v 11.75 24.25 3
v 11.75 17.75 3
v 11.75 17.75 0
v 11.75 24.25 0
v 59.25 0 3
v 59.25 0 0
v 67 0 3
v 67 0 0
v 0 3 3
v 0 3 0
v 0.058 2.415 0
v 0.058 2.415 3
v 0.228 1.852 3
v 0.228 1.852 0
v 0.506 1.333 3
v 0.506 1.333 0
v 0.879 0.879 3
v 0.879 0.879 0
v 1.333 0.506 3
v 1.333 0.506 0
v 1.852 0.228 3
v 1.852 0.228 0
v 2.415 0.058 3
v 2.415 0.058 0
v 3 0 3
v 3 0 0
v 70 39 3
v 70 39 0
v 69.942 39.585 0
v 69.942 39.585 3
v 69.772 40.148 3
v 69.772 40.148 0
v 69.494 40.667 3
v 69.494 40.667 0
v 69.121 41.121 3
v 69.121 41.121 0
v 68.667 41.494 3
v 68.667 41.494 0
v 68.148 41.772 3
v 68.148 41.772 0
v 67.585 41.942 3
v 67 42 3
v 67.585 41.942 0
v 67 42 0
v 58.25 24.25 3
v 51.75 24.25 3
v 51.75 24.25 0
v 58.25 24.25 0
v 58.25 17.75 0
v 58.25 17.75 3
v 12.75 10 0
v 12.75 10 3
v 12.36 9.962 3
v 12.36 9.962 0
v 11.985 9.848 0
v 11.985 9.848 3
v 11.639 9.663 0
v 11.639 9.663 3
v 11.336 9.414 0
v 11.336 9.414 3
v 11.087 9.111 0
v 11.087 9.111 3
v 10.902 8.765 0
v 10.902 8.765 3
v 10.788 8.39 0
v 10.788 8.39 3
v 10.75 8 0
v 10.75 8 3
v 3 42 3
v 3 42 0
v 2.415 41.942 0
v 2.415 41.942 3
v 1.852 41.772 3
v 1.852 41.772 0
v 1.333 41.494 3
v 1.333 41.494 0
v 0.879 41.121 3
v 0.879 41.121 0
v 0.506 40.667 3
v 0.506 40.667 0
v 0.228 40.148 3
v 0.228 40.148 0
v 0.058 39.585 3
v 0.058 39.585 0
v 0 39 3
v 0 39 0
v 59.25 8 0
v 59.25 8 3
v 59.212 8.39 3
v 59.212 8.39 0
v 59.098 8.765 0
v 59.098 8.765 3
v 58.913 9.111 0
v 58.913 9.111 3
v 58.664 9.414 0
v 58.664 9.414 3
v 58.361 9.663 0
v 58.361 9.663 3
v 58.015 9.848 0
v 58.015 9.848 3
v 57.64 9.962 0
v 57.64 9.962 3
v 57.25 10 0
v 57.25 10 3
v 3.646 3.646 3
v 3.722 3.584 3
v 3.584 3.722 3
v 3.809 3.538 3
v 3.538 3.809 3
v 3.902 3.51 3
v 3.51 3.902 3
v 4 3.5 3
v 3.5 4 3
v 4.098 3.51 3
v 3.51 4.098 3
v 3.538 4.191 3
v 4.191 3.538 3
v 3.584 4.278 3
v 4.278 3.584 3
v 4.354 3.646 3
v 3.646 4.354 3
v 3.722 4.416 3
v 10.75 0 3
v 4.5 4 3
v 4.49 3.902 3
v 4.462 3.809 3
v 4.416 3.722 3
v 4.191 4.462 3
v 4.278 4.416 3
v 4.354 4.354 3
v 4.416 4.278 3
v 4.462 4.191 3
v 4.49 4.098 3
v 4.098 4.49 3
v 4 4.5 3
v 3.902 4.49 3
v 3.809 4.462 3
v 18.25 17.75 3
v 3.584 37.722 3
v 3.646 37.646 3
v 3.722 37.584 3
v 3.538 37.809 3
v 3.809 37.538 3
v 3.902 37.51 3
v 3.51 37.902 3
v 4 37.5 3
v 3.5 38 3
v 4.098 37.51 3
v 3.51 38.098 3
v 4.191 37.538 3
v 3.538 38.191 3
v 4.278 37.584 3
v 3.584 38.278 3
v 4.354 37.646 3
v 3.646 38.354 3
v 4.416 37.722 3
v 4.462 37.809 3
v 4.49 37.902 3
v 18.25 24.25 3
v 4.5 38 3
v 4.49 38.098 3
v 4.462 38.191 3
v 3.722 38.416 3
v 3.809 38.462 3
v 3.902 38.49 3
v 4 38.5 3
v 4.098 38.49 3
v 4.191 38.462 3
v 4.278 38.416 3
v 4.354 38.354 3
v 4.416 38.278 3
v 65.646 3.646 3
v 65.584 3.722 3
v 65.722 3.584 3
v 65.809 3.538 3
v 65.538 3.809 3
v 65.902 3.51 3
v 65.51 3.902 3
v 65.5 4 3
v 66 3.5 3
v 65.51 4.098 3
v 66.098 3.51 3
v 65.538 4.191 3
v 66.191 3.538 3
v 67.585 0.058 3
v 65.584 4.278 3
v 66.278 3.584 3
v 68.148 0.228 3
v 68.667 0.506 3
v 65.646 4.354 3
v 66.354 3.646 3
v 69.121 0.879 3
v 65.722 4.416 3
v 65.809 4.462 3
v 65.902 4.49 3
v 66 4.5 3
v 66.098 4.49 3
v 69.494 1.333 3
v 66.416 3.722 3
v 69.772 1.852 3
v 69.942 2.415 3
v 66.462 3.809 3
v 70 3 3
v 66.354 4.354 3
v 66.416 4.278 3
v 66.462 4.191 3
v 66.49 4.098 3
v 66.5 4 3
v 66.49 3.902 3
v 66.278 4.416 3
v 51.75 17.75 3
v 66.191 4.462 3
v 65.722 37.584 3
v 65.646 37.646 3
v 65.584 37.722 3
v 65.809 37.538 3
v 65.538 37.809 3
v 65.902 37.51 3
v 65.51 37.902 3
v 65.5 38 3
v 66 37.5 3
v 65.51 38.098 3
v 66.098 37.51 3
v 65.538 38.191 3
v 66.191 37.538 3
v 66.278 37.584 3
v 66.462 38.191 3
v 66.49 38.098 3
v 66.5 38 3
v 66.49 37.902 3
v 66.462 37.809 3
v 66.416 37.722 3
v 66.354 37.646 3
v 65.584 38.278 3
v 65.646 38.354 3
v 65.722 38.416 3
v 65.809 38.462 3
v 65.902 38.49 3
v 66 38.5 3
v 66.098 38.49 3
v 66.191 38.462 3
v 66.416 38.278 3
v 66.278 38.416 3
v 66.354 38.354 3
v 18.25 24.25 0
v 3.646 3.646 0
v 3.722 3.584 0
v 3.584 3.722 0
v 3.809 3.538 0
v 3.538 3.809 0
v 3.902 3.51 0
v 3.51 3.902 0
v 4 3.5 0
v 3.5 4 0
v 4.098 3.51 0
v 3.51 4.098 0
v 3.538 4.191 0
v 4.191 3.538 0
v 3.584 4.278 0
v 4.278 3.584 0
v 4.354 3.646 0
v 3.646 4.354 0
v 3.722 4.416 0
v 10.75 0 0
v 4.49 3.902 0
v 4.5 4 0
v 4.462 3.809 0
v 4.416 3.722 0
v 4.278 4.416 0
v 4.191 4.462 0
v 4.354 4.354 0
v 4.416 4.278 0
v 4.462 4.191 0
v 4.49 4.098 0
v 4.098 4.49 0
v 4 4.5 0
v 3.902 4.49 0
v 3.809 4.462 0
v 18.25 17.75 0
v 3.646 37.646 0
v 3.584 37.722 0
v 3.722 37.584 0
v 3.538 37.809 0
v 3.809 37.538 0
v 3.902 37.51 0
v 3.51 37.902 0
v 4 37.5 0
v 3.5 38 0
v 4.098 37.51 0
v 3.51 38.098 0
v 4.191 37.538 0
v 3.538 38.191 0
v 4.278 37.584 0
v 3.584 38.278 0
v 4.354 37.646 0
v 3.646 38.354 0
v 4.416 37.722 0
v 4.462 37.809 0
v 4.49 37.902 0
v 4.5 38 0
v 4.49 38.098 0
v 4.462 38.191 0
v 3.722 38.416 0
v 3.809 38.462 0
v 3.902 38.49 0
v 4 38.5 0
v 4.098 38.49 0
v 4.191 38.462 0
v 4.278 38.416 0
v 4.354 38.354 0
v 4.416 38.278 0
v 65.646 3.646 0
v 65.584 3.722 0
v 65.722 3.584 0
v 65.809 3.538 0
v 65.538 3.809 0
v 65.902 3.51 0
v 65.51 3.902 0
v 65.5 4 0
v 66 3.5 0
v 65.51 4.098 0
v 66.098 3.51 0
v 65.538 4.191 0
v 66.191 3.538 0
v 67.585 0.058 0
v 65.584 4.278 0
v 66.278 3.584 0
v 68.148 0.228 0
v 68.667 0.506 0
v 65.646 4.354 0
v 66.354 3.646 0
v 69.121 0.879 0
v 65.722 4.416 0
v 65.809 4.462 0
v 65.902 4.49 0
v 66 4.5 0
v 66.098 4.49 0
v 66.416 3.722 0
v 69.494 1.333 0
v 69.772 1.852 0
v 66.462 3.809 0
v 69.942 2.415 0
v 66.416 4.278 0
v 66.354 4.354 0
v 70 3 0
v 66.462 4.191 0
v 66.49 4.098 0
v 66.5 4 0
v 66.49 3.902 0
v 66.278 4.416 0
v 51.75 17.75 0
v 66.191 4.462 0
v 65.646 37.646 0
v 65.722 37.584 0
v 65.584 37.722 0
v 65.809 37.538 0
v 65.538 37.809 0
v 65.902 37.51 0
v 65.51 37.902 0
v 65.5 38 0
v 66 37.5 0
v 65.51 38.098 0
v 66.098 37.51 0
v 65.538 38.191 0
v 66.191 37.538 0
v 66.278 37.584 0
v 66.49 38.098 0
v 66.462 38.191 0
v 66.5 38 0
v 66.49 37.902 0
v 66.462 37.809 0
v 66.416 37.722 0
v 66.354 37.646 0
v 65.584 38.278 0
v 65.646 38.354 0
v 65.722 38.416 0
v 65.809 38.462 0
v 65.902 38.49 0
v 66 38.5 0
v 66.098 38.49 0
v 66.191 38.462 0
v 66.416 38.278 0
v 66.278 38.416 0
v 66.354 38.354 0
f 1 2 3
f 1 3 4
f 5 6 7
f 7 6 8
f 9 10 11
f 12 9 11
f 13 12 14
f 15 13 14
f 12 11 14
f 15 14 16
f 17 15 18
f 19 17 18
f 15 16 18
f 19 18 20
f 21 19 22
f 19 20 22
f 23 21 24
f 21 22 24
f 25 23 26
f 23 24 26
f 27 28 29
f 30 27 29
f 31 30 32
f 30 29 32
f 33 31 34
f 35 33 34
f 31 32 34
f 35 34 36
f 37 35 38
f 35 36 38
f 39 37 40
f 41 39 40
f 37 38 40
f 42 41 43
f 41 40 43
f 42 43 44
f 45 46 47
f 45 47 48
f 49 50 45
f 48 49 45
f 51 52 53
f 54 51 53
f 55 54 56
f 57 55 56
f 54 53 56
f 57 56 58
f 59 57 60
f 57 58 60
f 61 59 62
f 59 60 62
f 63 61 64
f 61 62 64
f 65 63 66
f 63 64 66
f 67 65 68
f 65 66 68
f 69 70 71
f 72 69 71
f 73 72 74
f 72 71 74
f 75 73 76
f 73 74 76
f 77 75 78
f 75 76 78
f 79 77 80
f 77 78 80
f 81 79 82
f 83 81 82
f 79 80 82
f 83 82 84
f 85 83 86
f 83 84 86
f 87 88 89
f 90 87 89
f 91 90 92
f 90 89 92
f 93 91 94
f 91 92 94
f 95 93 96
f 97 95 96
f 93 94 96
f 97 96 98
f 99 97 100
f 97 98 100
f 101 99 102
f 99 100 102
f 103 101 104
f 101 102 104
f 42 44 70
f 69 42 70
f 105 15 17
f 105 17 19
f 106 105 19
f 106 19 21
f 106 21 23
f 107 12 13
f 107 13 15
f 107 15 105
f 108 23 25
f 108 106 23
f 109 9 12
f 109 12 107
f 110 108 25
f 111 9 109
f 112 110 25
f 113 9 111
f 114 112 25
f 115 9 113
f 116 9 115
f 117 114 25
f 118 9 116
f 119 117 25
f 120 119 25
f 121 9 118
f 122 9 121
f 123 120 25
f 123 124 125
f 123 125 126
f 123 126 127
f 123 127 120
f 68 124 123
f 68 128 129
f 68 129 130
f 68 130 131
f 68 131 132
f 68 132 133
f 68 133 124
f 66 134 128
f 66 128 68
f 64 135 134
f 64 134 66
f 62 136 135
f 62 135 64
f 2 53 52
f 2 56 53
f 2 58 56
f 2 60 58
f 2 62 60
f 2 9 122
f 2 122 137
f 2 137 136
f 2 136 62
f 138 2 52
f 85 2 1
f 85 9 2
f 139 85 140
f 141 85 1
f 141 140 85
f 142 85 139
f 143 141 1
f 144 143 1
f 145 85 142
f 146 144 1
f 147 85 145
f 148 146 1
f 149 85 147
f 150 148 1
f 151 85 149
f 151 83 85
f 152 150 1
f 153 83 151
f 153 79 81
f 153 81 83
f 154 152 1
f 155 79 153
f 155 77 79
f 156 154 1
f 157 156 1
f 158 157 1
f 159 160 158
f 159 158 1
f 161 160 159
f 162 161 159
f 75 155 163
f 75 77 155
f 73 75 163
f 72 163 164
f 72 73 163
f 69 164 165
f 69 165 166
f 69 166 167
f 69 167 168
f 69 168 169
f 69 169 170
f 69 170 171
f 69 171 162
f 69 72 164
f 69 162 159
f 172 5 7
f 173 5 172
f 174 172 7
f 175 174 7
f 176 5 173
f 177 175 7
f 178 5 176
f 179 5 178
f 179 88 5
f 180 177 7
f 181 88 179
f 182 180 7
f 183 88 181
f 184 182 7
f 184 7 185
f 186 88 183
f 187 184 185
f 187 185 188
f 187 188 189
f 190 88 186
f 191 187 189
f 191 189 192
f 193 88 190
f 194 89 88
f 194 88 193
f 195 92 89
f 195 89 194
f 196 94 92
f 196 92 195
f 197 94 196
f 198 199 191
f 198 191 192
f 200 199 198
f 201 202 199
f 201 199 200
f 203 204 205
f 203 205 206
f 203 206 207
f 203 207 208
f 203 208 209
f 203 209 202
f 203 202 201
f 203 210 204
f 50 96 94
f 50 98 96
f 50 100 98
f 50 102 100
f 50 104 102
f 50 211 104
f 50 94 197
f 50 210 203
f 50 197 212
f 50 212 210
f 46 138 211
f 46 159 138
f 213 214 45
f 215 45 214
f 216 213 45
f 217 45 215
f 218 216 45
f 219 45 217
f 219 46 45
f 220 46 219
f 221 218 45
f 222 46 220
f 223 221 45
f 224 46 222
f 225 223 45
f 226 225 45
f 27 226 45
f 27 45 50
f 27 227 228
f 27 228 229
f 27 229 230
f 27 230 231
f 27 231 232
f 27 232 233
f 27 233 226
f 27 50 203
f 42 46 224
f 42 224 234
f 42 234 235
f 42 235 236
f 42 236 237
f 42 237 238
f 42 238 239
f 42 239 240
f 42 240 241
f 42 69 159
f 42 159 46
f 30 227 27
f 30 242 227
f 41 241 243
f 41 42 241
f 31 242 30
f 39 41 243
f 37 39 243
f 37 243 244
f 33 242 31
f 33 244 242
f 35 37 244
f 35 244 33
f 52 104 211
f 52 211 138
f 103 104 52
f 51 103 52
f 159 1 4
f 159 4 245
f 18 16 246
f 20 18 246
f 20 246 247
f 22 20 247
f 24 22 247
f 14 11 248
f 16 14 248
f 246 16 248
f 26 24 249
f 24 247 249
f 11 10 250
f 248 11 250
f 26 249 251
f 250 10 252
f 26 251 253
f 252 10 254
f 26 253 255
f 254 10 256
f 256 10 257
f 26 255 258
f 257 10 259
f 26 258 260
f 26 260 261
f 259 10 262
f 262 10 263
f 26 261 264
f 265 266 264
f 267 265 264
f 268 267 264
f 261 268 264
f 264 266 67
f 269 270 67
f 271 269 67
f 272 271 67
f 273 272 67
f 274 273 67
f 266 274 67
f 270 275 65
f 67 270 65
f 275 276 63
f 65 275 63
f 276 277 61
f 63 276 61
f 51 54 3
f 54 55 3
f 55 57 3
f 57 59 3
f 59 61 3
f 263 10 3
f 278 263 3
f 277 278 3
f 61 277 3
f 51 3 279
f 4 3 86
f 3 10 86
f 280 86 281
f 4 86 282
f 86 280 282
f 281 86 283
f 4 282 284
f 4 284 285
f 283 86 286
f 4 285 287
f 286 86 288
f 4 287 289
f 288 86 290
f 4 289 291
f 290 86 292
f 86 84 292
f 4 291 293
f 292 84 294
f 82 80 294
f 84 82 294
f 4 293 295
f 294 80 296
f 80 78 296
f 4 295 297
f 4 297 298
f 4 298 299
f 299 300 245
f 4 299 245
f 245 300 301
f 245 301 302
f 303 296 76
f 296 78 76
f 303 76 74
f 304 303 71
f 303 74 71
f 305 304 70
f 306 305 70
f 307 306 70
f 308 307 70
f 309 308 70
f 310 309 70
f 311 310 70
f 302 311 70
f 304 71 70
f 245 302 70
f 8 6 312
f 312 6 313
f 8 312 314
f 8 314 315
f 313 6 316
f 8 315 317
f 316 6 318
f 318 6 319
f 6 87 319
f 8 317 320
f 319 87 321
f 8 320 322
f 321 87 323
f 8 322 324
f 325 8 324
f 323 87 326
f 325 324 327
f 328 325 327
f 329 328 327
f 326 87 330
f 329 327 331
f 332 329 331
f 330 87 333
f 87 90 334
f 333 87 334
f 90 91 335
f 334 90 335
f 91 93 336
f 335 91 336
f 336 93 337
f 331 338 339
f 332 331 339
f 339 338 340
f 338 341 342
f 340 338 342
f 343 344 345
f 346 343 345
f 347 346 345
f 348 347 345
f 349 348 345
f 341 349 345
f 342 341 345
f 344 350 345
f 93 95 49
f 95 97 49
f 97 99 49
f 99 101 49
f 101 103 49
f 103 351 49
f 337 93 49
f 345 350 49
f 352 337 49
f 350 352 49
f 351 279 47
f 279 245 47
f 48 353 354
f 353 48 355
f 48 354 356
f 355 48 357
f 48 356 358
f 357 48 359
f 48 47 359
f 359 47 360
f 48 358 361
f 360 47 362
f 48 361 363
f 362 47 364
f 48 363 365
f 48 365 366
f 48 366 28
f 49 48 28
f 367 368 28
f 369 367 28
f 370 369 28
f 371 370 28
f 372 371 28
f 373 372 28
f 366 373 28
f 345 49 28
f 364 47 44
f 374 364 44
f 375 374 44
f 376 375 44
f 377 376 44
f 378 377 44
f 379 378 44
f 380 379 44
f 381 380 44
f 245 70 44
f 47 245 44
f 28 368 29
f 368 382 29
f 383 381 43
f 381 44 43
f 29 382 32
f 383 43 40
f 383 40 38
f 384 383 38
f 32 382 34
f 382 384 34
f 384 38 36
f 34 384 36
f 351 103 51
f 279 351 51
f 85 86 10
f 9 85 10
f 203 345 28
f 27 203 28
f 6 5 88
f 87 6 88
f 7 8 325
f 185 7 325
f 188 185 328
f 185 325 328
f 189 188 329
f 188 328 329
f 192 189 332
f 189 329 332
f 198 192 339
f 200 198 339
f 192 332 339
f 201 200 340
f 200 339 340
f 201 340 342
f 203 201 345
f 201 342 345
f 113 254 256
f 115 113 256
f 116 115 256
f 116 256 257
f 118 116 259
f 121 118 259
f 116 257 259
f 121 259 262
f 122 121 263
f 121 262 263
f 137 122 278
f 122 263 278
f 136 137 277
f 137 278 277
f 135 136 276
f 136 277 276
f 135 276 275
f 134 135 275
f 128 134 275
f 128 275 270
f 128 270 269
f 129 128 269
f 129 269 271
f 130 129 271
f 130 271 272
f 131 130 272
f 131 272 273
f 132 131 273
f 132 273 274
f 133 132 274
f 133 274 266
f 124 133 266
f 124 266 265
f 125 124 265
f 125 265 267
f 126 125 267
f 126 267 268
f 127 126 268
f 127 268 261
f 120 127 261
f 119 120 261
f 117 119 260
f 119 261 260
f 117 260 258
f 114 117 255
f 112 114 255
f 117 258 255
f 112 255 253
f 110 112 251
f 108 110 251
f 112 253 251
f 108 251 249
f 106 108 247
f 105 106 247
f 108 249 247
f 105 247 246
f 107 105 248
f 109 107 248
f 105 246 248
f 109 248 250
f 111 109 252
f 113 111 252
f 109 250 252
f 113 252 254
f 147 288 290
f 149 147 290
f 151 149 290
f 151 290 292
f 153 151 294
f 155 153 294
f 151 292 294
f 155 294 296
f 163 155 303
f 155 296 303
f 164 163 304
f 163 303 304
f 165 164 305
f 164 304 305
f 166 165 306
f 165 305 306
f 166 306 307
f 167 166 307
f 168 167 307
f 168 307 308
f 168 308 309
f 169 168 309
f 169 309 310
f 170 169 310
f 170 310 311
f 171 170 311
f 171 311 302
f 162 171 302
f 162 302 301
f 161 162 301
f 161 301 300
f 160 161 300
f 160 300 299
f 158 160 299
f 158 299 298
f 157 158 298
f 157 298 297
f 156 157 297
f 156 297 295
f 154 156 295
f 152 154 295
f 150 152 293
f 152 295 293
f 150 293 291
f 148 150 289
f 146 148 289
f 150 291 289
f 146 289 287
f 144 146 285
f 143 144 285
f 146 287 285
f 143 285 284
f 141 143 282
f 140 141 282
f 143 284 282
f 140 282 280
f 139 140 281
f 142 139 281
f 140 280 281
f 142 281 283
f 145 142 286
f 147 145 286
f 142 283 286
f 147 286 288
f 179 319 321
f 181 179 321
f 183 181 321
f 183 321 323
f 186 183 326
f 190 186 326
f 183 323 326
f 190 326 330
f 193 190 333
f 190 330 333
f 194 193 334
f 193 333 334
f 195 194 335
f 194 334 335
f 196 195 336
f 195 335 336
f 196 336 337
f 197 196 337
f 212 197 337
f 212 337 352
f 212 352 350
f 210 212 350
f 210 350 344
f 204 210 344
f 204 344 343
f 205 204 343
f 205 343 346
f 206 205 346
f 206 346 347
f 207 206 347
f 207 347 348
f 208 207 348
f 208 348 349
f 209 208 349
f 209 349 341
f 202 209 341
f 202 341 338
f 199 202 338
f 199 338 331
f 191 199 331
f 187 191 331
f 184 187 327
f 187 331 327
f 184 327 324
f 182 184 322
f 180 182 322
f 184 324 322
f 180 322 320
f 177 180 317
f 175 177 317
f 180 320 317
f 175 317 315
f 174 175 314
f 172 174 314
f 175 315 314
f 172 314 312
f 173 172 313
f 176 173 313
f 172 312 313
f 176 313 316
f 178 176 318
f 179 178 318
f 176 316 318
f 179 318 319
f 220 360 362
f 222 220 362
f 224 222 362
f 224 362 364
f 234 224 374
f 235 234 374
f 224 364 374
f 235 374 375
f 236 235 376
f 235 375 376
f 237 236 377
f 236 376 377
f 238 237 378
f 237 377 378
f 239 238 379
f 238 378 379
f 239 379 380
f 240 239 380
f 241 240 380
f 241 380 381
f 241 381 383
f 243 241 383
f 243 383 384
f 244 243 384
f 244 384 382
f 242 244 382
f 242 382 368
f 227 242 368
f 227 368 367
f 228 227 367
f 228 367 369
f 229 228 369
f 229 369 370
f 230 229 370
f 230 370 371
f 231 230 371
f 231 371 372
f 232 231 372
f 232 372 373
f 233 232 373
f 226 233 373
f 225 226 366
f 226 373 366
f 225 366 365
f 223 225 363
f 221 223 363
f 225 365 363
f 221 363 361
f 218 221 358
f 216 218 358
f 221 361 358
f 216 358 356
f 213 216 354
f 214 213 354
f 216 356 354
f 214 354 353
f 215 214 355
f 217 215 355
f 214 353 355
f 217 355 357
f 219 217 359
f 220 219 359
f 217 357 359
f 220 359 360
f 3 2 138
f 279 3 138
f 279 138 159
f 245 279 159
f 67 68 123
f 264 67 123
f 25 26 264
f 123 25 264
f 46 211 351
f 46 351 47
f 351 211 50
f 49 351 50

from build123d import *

# Parameters (mm, degrees)
F1_DEPTH = 3
F3_D     = 4
F4_W     = 6.5
F4_H     = 6.5
F5_DEPTH = 3
F6_R     = 2
F7_DEPTH = 3.001
F9_D     = 1


with BuildPart() as f1:
    # F0 (on Top) → F1 (new body)
    with BuildSketch(Plane.XY):
        with BuildLine():
            ThreePointArc((0, 3), (0.87868, 0.87868), (3, 0))
            Line((3, 0), (67, 0))
            ThreePointArc((67, 0), (69.12132, 0.87868), (70, 3))
            Line((70, 3), (70, 39))
            ThreePointArc((70, 39), (69.12132, 41.12132), (67, 42))
            Line((67, 42), (3, 42))
            ThreePointArc((3, 42), (0.87868, 41.12132), (0, 39))
            Line((0, 39), (0, 3))
        make_face()
    extrude(amount=F1_DEPTH)

    # F3 (through all)
    with Locations(Plane.XY.offset(3)):
        with Locations((14, 7), (24.5, 7), (35, 7), (45.5, 7), (56, 7)):
            Hole(F3_D / 2)

    # F4 (on face) → F5 (cut, through all)
    with BuildSketch(Plane.XY.offset(3)):
        with Locations((15, 21)):
            Rectangle(F4_W, F4_H)
        with Locations((55, 21)):
            Rectangle(F4_W, F4_H)
    extrude(amount=-F5_DEPTH, mode=Mode.SUBTRACT)

    # F6 (on face) → F7 (cut, through all)
    with BuildSketch(Plane.XY.offset(3)):
        with BuildLine():
            Line((57.25, 10), (12.75, 10))
            ThreePointArc((12.75, 10), (11.335786, 9.414214), (10.75, 8))
            Line((10.75, 8), (10.75, 0))
            Line((10.75, 0), (59.25, 0))
            Line((59.25, 0), (59.25, 8))
            ThreePointArc((59.25, 8), (58.664214, 9.414214), (57.25, 10))
        make_face()
        with Locations((14, 7)):
            Circle(F6_R, mode=Mode.SUBTRACT)
        with Locations((24.5, 7)):
            Circle(F6_R, mode=Mode.SUBTRACT)
        with Locations((35, 7)):
            Circle(F6_R, mode=Mode.SUBTRACT)
        with Locations((45.5, 7)):
            Circle(F6_R, mode=Mode.SUBTRACT)
        with Locations((56, 7)):
            Circle(F6_R, mode=Mode.SUBTRACT)
    extrude(amount=-F7_DEPTH, mode=Mode.SUBTRACT)

    # F9 (through all)
    with Locations(Plane.XY.offset(3)):
        with Locations((4, 38), (4, 4), (66, 4), (66, 38)):
            Hole(F9_D / 2)


solid = f1.part
